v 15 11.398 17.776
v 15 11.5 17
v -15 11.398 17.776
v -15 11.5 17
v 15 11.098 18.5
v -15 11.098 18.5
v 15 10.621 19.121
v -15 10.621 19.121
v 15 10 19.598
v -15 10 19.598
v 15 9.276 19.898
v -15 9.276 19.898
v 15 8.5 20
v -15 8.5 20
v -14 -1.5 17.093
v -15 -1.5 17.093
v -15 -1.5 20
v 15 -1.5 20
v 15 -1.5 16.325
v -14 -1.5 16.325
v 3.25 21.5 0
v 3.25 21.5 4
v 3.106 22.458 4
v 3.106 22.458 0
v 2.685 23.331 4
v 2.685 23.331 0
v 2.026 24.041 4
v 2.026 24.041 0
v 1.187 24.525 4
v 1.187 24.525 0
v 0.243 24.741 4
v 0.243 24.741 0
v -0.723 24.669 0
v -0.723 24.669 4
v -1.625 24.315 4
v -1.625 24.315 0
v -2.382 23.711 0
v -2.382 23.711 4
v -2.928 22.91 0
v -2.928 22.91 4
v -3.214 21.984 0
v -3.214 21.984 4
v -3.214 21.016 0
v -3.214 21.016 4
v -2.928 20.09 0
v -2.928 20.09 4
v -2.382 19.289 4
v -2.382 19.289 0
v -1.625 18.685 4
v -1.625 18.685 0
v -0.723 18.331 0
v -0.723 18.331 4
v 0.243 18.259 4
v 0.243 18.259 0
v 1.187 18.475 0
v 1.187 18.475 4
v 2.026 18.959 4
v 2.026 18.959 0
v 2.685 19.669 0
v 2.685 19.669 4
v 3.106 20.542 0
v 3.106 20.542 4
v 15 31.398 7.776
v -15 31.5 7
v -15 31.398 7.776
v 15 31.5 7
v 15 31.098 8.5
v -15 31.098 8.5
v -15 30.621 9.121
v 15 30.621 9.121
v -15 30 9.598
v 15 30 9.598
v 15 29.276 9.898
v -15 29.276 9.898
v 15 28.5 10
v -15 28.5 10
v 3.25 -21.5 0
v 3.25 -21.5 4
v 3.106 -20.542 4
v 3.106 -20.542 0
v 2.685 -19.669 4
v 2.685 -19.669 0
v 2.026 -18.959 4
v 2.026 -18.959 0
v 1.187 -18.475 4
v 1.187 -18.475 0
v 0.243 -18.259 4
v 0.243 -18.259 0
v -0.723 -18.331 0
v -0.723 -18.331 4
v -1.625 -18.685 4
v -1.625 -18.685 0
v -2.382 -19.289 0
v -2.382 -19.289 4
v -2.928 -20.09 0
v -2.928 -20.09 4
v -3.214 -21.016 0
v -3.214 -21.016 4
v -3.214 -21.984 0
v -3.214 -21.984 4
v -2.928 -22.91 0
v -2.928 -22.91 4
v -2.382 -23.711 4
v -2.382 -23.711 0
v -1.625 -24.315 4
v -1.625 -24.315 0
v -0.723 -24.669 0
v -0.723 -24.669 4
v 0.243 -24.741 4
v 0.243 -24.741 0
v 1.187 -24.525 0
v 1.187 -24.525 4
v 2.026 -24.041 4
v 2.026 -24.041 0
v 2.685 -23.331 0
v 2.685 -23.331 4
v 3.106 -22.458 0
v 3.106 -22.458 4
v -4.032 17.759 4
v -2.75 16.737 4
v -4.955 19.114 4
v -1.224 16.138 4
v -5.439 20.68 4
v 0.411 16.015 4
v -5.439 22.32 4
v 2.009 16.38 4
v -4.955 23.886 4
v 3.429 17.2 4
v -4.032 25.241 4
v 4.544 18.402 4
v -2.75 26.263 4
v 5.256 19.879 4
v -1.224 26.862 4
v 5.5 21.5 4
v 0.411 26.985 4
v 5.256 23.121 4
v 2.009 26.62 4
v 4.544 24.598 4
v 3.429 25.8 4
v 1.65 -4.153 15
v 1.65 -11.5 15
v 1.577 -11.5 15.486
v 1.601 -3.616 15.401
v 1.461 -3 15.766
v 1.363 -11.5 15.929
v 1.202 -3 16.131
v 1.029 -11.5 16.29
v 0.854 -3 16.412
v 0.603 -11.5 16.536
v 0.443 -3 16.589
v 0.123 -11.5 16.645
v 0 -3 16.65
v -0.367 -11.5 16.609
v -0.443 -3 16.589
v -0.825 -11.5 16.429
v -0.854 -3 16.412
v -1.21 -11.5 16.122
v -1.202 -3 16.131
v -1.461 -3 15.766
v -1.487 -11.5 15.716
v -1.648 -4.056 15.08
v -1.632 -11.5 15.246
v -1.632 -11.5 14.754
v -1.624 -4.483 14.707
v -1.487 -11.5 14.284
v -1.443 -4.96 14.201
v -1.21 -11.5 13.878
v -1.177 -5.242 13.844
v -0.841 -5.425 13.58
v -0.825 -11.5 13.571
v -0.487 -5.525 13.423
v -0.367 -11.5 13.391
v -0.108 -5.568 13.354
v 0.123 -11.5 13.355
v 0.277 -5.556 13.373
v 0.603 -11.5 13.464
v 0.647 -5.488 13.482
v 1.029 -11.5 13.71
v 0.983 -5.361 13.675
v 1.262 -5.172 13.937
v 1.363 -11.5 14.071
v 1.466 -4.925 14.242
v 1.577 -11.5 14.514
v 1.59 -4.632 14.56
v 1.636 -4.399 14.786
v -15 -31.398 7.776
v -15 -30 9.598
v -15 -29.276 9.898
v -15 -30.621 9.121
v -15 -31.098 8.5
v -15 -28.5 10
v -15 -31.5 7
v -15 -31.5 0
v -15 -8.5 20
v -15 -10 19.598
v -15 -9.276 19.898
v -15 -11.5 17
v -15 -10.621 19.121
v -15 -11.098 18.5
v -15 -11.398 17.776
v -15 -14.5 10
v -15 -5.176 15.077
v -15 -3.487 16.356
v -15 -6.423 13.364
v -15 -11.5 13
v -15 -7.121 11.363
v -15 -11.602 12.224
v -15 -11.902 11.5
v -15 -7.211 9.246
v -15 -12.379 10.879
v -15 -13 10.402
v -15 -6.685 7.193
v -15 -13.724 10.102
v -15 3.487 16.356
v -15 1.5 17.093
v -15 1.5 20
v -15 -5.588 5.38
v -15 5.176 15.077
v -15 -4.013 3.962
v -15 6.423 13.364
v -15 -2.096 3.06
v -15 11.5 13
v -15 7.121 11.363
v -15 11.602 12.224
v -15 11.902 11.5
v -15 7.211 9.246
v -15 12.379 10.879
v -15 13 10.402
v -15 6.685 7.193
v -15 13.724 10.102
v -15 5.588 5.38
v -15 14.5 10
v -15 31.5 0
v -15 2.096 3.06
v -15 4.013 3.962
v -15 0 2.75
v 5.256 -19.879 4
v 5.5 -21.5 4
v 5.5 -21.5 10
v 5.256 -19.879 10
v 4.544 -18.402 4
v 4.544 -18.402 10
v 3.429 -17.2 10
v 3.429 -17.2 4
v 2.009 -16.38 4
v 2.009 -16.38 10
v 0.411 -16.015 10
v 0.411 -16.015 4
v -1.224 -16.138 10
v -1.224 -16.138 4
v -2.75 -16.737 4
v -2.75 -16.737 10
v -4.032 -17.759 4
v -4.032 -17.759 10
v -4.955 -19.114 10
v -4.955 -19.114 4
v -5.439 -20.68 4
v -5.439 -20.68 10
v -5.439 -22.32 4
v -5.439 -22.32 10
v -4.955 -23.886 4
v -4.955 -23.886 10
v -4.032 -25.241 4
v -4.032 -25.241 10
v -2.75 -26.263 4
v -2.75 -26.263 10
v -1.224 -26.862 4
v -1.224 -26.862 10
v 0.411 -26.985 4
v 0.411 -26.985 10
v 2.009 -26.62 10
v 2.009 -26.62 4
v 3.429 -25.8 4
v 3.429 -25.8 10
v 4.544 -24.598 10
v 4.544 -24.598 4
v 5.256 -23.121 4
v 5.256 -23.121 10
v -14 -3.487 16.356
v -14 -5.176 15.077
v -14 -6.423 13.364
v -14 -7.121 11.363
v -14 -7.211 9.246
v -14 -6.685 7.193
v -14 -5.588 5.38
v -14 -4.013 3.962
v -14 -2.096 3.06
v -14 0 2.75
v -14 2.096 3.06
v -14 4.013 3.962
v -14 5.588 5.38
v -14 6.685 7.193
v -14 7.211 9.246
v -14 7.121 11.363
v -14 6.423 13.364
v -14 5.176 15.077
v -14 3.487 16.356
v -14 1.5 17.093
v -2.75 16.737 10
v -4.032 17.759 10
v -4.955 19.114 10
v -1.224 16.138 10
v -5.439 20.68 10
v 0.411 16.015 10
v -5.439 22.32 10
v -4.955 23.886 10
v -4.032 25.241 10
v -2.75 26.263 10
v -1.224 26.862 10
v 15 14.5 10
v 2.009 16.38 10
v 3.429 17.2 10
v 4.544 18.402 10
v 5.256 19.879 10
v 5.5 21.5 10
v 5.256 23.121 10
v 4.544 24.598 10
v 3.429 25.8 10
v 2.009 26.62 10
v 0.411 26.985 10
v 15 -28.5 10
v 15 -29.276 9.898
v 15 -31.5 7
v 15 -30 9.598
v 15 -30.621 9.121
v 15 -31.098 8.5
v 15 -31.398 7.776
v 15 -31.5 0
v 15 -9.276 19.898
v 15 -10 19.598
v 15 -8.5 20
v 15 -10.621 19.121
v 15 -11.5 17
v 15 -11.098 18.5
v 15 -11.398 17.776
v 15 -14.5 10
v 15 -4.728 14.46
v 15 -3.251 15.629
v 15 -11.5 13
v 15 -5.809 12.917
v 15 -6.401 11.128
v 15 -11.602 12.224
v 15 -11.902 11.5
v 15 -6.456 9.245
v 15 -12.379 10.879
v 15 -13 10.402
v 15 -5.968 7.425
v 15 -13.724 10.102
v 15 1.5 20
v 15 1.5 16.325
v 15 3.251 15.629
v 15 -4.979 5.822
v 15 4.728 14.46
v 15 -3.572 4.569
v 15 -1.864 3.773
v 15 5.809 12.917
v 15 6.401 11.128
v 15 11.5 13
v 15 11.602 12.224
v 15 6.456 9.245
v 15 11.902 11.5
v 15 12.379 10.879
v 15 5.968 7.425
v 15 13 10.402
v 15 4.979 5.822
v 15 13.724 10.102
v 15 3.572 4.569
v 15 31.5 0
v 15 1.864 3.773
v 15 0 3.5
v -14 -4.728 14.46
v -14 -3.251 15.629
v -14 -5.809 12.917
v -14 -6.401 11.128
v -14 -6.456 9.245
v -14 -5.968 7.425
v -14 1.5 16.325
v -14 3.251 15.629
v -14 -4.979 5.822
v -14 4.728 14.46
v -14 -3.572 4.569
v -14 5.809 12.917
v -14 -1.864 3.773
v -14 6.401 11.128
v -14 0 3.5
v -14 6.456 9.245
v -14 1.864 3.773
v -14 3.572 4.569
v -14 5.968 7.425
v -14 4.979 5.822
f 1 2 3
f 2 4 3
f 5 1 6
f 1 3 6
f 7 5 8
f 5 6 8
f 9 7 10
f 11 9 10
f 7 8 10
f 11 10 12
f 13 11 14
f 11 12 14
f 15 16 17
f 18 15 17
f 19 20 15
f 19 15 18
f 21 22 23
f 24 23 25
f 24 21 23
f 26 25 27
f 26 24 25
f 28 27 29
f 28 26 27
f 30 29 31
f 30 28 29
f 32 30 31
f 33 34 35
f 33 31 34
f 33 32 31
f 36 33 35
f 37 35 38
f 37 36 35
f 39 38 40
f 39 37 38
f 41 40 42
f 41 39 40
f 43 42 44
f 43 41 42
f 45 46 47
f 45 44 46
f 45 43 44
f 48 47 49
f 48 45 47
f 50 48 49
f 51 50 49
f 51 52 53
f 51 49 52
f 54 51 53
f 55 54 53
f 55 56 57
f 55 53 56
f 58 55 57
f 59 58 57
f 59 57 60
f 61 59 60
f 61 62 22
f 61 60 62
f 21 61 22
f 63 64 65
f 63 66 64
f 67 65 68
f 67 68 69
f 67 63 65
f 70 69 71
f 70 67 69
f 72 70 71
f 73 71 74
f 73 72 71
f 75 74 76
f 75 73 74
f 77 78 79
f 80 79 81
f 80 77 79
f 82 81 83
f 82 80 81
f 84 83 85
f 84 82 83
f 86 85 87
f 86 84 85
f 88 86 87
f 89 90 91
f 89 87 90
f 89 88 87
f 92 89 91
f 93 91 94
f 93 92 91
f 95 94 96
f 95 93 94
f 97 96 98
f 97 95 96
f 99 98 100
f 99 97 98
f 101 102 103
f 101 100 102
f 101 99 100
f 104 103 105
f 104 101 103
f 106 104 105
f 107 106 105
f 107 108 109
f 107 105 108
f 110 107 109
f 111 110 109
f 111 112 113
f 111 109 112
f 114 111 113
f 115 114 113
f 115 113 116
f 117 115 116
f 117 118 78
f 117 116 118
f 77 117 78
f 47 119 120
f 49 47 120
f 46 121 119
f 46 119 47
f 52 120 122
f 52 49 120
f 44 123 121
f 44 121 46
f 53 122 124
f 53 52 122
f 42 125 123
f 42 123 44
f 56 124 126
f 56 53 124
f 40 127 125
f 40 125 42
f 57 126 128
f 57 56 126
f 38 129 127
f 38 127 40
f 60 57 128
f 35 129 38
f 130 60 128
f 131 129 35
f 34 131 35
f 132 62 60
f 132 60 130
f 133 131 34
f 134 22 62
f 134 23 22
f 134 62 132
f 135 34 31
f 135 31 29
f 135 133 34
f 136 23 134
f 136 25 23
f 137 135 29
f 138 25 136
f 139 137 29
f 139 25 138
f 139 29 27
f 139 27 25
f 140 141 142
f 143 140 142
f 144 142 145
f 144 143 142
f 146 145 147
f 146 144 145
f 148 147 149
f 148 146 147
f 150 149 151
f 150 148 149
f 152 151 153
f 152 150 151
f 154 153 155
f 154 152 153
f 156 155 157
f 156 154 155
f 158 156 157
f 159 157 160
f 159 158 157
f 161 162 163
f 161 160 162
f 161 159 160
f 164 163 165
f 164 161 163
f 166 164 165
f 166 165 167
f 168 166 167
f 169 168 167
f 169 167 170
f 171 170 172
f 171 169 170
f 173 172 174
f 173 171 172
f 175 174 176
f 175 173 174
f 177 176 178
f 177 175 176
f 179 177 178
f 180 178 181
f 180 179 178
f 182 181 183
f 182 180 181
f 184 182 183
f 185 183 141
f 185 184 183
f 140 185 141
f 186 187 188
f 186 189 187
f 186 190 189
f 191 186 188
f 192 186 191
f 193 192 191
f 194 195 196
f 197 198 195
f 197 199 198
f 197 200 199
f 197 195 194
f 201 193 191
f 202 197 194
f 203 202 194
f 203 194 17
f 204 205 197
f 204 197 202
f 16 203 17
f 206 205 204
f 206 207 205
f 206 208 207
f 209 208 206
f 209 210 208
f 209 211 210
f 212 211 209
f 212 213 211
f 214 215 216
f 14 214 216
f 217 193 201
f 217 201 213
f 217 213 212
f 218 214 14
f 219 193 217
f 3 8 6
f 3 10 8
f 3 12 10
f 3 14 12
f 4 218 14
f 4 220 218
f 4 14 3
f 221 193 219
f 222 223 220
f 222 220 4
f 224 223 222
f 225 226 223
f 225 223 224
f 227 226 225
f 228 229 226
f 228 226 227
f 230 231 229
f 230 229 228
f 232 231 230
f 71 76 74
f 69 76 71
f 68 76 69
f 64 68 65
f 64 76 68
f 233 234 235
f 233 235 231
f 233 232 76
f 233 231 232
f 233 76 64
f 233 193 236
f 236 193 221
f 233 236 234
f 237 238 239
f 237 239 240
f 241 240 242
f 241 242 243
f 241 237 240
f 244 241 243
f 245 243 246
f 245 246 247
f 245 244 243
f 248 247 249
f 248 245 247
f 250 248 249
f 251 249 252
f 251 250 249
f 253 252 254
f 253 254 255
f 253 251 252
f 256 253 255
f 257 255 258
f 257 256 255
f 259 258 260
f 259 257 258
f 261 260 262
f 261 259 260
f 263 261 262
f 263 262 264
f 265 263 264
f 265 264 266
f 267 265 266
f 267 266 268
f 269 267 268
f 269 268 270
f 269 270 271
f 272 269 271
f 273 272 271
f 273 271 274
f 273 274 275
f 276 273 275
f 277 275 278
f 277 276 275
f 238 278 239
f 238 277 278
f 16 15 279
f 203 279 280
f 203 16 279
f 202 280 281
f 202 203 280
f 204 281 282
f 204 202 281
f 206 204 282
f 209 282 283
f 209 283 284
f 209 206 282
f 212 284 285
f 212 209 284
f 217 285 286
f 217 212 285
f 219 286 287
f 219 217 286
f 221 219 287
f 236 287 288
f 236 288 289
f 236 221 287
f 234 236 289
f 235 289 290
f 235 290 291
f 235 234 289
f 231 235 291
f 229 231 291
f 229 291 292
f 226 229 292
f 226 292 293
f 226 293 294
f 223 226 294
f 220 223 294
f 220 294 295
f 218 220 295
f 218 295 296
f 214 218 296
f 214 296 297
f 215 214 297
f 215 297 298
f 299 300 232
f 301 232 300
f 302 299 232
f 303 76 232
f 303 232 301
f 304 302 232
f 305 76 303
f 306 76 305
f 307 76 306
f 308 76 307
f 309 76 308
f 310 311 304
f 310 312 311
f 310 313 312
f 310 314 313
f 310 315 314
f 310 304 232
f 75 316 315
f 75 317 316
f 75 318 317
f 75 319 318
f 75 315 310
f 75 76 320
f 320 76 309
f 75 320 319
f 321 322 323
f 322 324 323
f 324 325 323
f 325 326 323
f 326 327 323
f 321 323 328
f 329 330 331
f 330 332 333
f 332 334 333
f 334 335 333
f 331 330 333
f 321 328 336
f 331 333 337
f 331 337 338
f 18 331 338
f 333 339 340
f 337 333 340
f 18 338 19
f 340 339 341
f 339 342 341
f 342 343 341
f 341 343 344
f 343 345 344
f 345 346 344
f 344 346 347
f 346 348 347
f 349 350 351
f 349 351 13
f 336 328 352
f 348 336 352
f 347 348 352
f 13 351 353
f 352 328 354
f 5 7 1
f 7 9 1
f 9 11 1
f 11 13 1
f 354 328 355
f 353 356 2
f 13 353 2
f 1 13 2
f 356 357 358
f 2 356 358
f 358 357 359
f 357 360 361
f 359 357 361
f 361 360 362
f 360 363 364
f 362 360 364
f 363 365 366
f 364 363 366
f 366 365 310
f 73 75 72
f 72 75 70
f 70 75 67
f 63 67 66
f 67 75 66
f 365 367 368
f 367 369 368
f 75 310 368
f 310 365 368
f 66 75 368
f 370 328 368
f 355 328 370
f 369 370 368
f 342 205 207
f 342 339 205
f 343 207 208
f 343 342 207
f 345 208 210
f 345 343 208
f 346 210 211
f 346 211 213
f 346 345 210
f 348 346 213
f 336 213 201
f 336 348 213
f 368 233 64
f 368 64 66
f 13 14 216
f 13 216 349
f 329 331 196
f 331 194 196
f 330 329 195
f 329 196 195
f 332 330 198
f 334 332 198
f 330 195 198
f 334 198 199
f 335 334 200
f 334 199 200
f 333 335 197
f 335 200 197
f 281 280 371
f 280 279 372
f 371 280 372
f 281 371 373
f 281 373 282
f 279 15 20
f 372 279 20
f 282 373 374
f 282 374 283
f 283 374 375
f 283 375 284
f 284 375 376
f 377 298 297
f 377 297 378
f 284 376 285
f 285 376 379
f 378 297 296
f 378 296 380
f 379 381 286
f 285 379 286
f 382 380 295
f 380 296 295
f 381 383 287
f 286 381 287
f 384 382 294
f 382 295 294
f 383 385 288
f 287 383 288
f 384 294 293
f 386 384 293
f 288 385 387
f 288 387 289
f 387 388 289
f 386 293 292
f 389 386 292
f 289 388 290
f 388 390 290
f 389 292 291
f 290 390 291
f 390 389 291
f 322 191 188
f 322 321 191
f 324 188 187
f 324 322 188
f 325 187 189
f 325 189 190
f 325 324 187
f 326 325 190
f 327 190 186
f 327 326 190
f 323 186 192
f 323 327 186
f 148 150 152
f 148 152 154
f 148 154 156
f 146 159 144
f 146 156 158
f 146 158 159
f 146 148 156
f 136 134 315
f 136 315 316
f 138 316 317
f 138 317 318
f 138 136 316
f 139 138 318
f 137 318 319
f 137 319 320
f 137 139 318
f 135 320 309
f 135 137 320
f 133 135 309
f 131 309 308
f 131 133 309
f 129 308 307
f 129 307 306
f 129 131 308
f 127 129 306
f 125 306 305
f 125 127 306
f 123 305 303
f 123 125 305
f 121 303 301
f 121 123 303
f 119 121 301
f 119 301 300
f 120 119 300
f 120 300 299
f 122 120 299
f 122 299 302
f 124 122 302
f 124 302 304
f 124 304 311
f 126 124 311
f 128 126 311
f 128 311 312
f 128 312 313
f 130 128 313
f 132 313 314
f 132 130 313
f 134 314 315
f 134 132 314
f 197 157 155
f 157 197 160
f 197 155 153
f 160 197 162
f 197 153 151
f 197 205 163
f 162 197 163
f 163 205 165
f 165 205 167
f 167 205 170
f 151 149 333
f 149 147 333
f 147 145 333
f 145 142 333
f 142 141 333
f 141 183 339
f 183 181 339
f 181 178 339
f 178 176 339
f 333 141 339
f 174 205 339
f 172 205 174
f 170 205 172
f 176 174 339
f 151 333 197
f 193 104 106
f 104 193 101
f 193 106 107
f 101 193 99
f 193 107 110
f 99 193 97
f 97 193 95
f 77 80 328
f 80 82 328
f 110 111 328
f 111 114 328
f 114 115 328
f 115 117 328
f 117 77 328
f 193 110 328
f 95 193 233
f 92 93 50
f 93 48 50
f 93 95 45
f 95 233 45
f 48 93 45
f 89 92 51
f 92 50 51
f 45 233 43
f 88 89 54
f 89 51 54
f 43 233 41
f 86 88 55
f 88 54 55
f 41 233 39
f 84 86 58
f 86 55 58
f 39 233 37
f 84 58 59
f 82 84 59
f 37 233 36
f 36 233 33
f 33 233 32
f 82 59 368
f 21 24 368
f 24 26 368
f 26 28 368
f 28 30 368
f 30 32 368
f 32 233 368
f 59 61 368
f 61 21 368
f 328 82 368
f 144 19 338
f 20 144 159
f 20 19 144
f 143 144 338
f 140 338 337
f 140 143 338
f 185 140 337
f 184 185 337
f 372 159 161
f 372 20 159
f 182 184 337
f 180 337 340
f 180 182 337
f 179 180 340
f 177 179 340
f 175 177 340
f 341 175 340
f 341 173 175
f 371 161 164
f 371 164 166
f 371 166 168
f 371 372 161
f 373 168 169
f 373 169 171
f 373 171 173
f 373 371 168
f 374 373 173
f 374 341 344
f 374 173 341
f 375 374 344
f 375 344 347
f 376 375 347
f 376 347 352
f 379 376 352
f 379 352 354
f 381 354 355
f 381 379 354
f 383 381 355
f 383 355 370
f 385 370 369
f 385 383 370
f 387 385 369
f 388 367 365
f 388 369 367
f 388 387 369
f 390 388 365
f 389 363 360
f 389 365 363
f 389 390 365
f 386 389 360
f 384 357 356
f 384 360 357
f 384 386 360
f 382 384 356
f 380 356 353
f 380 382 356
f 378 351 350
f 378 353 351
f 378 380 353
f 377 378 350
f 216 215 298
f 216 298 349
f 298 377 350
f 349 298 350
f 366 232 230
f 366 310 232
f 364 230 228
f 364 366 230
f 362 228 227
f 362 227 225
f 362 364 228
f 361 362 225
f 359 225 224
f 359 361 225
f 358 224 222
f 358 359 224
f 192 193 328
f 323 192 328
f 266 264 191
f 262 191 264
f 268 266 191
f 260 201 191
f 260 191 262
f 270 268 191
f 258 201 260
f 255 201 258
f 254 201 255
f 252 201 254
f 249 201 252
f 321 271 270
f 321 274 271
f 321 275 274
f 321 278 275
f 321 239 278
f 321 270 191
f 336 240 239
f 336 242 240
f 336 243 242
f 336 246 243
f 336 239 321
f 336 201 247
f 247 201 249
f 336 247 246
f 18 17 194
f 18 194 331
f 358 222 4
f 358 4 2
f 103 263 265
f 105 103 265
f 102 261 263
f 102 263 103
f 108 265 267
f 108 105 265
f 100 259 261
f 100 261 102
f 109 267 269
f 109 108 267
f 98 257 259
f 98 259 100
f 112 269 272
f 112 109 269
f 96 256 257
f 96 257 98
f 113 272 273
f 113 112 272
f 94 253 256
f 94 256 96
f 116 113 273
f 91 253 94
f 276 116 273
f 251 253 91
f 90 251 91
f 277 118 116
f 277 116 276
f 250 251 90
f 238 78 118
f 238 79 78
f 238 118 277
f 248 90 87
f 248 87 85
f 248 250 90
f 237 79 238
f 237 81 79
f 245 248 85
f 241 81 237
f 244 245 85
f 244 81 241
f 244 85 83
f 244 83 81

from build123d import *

# Parameters (mm, degrees)
CYLINDER008_R             = 1.65
CYLINDER008_DEPTH         = 10
CYLINDER007_R             = 7.25
CYLINDER007_DEPTH         = 1
CYLINDER006_R             = 6.5
CYLINDER006_DEPTH         = 32
FUSION005_PLACEMENT_ANGLE = 90
BOX003_W                  = 30
BOX003_H                  = 3
BOX003_DEPTH              = 15
CYLINDER003_R             = 3.25
CYLINDER003_DEPTH         = 10
CYLINDER002_R             = 5.5
CYLINDER002_DEPTH         = 6
CYLINDER005_R             = 3.25
CYLINDER005_DEPTH         = 10
CYLINDER004_R             = 5.5
CYLINDER004_DEPTH         = 6
BOX002_W                  = 30
BOX002_H                  = 20
BOX002_DEPTH              = 20
BOX001_W                  = 30
BOX001_H                  = 20
BOX001_DEPTH              = 20
BOX_W                     = 30
BOX_H                     = 63
BOX_DEPTH                 = 20
FILLET_R                  = 3


with BuildPart() as m4wormscrew:
    # Cylinder008 → Cylinder008 (new body)
    with BuildSketch(Plane(origin=(0, -3, 15), x_dir=(1, 0, 0), z_dir=(0, -1, 0))):
        Circle(CYLINDER008_R)
    extrude(amount=CYLINDER008_DEPTH)


with BuildPart() as cylinder007:
    # Cylinder007 → Cylinder007 (new body)
    with BuildSketch(Plane.XY):
        Circle(CYLINDER007_R)
    extrude(amount=CYLINDER007_DEPTH)


with BuildPart() as lasermoduletemplate001:
    # Cylinder006 → Cylinder006 (new body)
    with BuildSketch(Plane.XY):
        Circle(CYLINDER006_R)
    extrude(amount=CYLINDER006_DEPTH)

    # Fusion005: union Cylinder007
    add(cylinder007.part)


with BuildPart() as lasermoduletemplate001_1:
    # Fusion005 placement: moved
    add(lasermoduletemplate001.part.moved(Location((-15, 0, 10))).rotate(Axis((-15, 0, 10), (0, 1, 0)), FUSION005_PLACEMENT_ANGLE))


with BuildPart() as cube003:
    # Box003 → Box003 (new body)
    with BuildSketch(Plane(origin=(-15, -1.5, 15), x_dir=(1, 0, 0), z_dir=(0, 0, 1))):
        with Locations((15, 1.5)):
            Rectangle(BOX003_W, BOX003_H)
    extrude(amount=BOX003_DEPTH)


with BuildPart() as cylinder003:
    # Cylinder003 → Cylinder003 (new body)
    with BuildSketch(Plane.XY):
        Circle(CYLINDER003_R)
    extrude(amount=CYLINDER003_DEPTH)


with BuildPart() as screwthrough001:
    # Cylinder002 → Cylinder002 (new body)
    with BuildSketch(Plane.XY.offset(4)):
        Circle(CYLINDER002_R)
    extrude(amount=CYLINDER002_DEPTH)

    # Fusion001: union Cylinder003
    add(cylinder003.part)


with BuildPart() as screwthrough001_1:
    # Fusion001 placement: moved
    add(screwthrough001.part.moved(Location((0, -21.5, 0))))


with BuildPart() as cylinder005:
    # Cylinder005 → Cylinder005 (new body)
    with BuildSketch(Plane.XY):
        Circle(CYLINDER005_R)
    extrude(amount=CYLINDER005_DEPTH)


with BuildPart() as fusion004:
    # Cylinder004 → Cylinder004 (new body)
    with BuildSketch(Plane.XY.offset(4)):
        Circle(CYLINDER004_R)
    extrude(amount=CYLINDER004_DEPTH)

    # Fusion002: union Cylinder005
    add(cylinder005.part)


with BuildPart() as fusion004_1:
    # Fusion002 placement: moved
    add(fusion004.part.moved(Location((0, 21.5, 0))))

    # Fusion004: union ScrewThrough001
    add(screwthrough001_1.part)


with BuildPart() as cube002:
    # Box002 → Box002 (new body)
    with BuildSketch(Plane(origin=(-15, -31.5, 10), x_dir=(1, 0, 0), z_dir=(0, 0, 1))):
        with Locations((15, 10)):
            Rectangle(BOX002_W, BOX002_H)
    extrude(amount=BOX002_DEPTH)


with BuildPart() as fusion003:
    # Box001 → Box001 (new body)
    with BuildSketch(Plane(origin=(-15, 11.5, 10), x_dir=(1, 0, 0), z_dir=(0, 0, 1))):
        with Locations((15, 10)):
            Rectangle(BOX001_W, BOX001_H)
    extrude(amount=BOX001_DEPTH)

    # Fusion003: union Cube002
    add(cube002.part)


with BuildPart() as cut004:
    # Box → Box (new body)
    with BuildSketch(Plane(origin=(-15, -31.5, 0), x_dir=(1, 0, 0), z_dir=(0, 0, 1))):
        with Locations((15, 31.5)):
            Rectangle(BOX_W, BOX_H)
    extrude(amount=BOX_DEPTH)

    # Cut: cut Fusion003
    add(fusion003.part, mode=Mode.SUBTRACT)

    # Cut001: cut Fusion004
    add(fusion004_1.part, mode=Mode.SUBTRACT)

    # Cut002: cut Cube003
    add(cube003.part, mode=Mode.SUBTRACT)

    # Cut003: cut LaserModuleTemplate001
    add(lasermoduletemplate001_1.part, mode=Mode.SUBTRACT)

    # Fillet
    fillet_edges = [cut004.edges().sort_by_distance(p)[0] for p in [
        (0, -31.5, 10),
        (0, -11.5, 10),
        (0, -11.5, 20),
        (0, 11.5, 20),
        (0, 11.5, 10),
        (0, 31.5, 10),
    ]]
    fillet(fillet_edges, radius=FILLET_R)

    # Cut004: cut M4WormScrew
    add(m4wormscrew.part, mode=Mode.SUBTRACT)


solid = cut004.part
